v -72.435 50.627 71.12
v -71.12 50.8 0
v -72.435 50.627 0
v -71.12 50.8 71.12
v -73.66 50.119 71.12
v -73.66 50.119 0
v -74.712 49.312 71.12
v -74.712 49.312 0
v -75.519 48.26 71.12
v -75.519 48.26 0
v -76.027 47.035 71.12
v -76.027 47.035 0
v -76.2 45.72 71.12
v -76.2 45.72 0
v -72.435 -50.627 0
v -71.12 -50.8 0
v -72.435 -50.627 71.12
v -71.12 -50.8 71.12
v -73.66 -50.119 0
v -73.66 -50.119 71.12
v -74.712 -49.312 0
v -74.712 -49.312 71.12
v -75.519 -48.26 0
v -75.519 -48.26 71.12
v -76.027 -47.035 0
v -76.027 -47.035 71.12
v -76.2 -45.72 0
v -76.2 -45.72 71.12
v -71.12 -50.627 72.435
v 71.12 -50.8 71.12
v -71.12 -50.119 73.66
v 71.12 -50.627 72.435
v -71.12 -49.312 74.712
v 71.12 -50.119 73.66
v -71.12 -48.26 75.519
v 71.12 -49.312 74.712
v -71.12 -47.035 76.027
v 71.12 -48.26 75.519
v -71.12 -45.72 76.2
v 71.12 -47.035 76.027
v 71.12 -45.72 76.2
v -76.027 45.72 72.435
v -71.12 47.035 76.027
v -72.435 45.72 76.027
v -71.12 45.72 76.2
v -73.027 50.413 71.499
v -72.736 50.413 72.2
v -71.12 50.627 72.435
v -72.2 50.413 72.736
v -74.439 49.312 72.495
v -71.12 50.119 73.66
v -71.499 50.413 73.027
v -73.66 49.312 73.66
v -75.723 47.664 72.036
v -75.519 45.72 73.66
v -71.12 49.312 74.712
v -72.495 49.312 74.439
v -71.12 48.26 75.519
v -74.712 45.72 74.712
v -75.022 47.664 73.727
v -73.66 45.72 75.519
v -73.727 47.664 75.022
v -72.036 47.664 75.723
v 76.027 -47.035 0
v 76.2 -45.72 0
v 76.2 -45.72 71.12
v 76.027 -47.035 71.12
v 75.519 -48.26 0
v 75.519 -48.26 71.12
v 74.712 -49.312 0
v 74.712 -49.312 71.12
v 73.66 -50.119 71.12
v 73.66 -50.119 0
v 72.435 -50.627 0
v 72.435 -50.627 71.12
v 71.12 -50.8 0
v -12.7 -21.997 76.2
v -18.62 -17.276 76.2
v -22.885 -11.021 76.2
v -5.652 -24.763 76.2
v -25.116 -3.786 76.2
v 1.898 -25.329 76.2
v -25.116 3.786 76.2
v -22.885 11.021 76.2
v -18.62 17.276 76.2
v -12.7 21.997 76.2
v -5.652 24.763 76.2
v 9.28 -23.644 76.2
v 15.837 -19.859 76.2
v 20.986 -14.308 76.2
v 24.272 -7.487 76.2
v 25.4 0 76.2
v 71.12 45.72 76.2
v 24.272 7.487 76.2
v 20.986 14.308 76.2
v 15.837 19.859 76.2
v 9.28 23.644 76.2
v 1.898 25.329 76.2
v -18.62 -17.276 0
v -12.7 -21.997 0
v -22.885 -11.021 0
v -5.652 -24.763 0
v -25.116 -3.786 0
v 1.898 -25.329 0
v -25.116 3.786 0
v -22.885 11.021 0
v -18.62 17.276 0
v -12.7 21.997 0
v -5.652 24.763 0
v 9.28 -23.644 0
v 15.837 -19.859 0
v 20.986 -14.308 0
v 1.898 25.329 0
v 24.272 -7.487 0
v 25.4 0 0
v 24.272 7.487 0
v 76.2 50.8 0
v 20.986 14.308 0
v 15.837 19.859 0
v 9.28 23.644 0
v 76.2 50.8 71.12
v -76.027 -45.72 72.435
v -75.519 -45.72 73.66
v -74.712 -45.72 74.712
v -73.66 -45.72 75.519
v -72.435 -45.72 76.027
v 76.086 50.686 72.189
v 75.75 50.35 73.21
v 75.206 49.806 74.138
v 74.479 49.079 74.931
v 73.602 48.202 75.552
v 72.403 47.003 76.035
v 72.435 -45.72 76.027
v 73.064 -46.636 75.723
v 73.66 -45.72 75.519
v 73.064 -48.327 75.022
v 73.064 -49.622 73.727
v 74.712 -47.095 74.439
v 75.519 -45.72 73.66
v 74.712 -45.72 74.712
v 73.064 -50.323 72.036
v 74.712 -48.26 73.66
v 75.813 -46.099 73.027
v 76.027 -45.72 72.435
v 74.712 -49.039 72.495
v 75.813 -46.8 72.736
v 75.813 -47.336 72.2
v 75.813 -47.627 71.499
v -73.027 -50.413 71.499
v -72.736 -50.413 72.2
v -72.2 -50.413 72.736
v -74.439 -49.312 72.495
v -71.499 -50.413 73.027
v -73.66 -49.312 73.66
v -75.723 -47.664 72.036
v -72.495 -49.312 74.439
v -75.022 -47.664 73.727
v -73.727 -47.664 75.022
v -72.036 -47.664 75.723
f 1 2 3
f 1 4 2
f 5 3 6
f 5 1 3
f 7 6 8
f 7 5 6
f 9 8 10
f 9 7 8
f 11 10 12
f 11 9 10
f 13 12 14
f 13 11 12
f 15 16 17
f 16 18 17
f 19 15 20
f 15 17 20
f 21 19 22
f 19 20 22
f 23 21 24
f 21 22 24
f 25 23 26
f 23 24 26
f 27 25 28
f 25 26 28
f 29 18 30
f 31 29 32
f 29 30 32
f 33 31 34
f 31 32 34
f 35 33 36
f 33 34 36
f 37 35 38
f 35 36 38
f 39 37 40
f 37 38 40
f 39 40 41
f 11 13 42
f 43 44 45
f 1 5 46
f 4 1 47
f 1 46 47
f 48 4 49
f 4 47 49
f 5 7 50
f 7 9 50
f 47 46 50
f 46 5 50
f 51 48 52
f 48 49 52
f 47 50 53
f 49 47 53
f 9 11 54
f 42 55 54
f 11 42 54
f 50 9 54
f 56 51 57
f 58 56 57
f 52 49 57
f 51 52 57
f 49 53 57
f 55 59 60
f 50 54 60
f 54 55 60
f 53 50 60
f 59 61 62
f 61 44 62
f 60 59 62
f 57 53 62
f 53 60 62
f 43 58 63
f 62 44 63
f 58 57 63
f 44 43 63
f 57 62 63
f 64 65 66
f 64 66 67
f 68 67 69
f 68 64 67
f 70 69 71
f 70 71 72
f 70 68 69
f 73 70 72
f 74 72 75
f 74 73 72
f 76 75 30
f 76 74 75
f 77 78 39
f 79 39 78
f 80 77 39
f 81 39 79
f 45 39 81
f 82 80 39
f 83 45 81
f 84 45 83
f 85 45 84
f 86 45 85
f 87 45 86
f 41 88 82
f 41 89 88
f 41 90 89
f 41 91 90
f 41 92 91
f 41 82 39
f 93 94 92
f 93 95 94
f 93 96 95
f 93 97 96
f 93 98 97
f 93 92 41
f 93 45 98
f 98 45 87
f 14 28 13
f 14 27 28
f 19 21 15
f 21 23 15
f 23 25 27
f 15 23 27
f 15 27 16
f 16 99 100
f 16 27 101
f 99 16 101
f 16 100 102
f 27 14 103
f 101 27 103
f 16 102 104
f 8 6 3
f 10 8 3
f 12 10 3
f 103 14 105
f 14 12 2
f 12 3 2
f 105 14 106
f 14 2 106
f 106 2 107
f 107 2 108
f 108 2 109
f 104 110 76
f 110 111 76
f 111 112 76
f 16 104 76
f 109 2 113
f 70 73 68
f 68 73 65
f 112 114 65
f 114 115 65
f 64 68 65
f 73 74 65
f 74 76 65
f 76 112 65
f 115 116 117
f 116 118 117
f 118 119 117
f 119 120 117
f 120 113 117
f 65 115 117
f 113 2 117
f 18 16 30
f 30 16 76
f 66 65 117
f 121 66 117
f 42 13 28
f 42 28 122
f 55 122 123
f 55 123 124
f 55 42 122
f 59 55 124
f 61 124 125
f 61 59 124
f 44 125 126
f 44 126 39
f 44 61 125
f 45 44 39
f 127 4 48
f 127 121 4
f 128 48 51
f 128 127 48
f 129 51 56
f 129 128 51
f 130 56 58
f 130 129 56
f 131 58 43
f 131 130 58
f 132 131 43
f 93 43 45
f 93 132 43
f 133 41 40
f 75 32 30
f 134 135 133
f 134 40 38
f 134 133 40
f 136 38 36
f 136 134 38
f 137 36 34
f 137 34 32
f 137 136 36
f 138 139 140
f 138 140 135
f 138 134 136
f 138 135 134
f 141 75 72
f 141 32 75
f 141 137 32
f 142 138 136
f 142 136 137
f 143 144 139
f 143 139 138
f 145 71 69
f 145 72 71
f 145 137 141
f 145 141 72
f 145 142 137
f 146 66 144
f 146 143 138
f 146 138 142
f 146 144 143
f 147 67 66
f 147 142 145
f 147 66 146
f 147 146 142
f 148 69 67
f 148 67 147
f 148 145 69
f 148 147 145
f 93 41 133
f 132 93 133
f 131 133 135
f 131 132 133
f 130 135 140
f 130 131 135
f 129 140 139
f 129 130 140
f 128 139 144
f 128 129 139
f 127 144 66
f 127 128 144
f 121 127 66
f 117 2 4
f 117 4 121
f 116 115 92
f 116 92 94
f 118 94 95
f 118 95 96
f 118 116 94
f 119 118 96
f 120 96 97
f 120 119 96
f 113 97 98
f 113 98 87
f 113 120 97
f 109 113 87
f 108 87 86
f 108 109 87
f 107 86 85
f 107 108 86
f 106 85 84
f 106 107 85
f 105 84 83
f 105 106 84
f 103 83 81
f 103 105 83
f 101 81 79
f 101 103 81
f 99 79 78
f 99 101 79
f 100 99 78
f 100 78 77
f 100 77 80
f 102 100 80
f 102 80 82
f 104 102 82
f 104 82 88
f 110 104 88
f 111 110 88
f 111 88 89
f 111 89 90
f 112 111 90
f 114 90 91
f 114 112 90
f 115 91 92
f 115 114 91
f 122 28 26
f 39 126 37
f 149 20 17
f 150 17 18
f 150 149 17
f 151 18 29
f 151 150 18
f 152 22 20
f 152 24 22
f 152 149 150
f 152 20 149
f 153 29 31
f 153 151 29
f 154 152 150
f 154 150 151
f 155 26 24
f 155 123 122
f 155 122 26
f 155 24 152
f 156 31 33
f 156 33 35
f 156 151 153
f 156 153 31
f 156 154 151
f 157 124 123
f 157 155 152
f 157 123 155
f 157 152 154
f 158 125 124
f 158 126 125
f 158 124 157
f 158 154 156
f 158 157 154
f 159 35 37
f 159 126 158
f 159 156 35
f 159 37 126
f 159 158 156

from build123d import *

# Parameters (mm, degrees)
F0_W        = 152.4
F0_H        = 101.6
F0_R        = 25.4
F1_DEPTH    = 76.2
F2_R        = 5.08
F3_R        = 5.08
F4_T1_DEPTH = 83.82
F4_S5_W     = 5.08
F4_S5_H     = 5.08
F4_T6_DEPTH = 5.08


# Not quite as in the source:
# - a fillet or chamfer that OpenCascade refuses, or shapes differently, is made with other operations: its cross-section is extruded or revolved along the edge and cut away or added


with BuildPart() as f1:
    # F0 (on Top) → F1 (new body)
    with BuildSketch(Plane.XY):
        Rectangle(F0_W, F0_H)
        Circle(F0_R, mode=Mode.SUBTRACT)
    extrude(amount=F1_DEPTH)

    # F2
    f2_edges = [f1.edges().sort_by_distance(p)[0] for p in [
        (-76.2, 0, 76.2),
    ]]
    fillet(f2_edges, radius=F2_R)

    # F3
    f3_edges = [f1.edges().sort_by_distance(p)[0] for p in [
        (2.54, 50.8, 76.2),
        (76.2, 0, 76.2),
        (2.54, -50.8, 76.2),
    ]]
    fillet(f3_edges, radius=F3_R)

    # F4: fillet of radius 5.08 on 1 edges, made by hand

    # F4_s2 → F4_t1 (cut)
    with BuildSketch(Plane.XY.offset(-12.7)):
        with BuildLine():
            ThreePointArc((76.2, -45.72), (74.7121024484, -49.3121024484), (71.12, -50.8))
            Line((71.12, -50.8), (76.2, -50.8))
            Line((76.2, -50.8), (76.2, -45.72))
        make_face()
    extrude(amount=F4_T1_DEPTH, mode=Mode.SUBTRACT)


with BuildPart() as f4_tool4:
    # F4_s5 → F4_t6 (new body)
    with BuildSketch(Plane.YZ.offset(71.12)):
        with Locations((-48.26, 73.66)):
            Rectangle(F4_S5_W, F4_S5_H)
    extrude(amount=F4_T6_DEPTH)

    # F4_s7 → F4_t8 (revolve, cut)
    with BuildSketch(Plane(origin=(71.12, -45.72, 71.12), x_dir=(0, 0.7071067812, -0.7071067812), z_dir=(0, -0.7071067812, -0.7071067812))):
        with BuildLine():
            ThreePointArc((0, -5.08), (5.08, 0), (0, 5.08))
            Line((0, 5.08), (0, -5.08))
        make_face()
    revolve(axis=Axis((71.12, -45.72, 71.12), (1, 0, 0)), mode=Mode.SUBTRACT)


with BuildPart() as f1_1:
    add(f1.part)

    # F4_t3: cut F4_tool4
    add(f4_tool4.part, mode=Mode.SUBTRACT)


solid = f1_1.part
